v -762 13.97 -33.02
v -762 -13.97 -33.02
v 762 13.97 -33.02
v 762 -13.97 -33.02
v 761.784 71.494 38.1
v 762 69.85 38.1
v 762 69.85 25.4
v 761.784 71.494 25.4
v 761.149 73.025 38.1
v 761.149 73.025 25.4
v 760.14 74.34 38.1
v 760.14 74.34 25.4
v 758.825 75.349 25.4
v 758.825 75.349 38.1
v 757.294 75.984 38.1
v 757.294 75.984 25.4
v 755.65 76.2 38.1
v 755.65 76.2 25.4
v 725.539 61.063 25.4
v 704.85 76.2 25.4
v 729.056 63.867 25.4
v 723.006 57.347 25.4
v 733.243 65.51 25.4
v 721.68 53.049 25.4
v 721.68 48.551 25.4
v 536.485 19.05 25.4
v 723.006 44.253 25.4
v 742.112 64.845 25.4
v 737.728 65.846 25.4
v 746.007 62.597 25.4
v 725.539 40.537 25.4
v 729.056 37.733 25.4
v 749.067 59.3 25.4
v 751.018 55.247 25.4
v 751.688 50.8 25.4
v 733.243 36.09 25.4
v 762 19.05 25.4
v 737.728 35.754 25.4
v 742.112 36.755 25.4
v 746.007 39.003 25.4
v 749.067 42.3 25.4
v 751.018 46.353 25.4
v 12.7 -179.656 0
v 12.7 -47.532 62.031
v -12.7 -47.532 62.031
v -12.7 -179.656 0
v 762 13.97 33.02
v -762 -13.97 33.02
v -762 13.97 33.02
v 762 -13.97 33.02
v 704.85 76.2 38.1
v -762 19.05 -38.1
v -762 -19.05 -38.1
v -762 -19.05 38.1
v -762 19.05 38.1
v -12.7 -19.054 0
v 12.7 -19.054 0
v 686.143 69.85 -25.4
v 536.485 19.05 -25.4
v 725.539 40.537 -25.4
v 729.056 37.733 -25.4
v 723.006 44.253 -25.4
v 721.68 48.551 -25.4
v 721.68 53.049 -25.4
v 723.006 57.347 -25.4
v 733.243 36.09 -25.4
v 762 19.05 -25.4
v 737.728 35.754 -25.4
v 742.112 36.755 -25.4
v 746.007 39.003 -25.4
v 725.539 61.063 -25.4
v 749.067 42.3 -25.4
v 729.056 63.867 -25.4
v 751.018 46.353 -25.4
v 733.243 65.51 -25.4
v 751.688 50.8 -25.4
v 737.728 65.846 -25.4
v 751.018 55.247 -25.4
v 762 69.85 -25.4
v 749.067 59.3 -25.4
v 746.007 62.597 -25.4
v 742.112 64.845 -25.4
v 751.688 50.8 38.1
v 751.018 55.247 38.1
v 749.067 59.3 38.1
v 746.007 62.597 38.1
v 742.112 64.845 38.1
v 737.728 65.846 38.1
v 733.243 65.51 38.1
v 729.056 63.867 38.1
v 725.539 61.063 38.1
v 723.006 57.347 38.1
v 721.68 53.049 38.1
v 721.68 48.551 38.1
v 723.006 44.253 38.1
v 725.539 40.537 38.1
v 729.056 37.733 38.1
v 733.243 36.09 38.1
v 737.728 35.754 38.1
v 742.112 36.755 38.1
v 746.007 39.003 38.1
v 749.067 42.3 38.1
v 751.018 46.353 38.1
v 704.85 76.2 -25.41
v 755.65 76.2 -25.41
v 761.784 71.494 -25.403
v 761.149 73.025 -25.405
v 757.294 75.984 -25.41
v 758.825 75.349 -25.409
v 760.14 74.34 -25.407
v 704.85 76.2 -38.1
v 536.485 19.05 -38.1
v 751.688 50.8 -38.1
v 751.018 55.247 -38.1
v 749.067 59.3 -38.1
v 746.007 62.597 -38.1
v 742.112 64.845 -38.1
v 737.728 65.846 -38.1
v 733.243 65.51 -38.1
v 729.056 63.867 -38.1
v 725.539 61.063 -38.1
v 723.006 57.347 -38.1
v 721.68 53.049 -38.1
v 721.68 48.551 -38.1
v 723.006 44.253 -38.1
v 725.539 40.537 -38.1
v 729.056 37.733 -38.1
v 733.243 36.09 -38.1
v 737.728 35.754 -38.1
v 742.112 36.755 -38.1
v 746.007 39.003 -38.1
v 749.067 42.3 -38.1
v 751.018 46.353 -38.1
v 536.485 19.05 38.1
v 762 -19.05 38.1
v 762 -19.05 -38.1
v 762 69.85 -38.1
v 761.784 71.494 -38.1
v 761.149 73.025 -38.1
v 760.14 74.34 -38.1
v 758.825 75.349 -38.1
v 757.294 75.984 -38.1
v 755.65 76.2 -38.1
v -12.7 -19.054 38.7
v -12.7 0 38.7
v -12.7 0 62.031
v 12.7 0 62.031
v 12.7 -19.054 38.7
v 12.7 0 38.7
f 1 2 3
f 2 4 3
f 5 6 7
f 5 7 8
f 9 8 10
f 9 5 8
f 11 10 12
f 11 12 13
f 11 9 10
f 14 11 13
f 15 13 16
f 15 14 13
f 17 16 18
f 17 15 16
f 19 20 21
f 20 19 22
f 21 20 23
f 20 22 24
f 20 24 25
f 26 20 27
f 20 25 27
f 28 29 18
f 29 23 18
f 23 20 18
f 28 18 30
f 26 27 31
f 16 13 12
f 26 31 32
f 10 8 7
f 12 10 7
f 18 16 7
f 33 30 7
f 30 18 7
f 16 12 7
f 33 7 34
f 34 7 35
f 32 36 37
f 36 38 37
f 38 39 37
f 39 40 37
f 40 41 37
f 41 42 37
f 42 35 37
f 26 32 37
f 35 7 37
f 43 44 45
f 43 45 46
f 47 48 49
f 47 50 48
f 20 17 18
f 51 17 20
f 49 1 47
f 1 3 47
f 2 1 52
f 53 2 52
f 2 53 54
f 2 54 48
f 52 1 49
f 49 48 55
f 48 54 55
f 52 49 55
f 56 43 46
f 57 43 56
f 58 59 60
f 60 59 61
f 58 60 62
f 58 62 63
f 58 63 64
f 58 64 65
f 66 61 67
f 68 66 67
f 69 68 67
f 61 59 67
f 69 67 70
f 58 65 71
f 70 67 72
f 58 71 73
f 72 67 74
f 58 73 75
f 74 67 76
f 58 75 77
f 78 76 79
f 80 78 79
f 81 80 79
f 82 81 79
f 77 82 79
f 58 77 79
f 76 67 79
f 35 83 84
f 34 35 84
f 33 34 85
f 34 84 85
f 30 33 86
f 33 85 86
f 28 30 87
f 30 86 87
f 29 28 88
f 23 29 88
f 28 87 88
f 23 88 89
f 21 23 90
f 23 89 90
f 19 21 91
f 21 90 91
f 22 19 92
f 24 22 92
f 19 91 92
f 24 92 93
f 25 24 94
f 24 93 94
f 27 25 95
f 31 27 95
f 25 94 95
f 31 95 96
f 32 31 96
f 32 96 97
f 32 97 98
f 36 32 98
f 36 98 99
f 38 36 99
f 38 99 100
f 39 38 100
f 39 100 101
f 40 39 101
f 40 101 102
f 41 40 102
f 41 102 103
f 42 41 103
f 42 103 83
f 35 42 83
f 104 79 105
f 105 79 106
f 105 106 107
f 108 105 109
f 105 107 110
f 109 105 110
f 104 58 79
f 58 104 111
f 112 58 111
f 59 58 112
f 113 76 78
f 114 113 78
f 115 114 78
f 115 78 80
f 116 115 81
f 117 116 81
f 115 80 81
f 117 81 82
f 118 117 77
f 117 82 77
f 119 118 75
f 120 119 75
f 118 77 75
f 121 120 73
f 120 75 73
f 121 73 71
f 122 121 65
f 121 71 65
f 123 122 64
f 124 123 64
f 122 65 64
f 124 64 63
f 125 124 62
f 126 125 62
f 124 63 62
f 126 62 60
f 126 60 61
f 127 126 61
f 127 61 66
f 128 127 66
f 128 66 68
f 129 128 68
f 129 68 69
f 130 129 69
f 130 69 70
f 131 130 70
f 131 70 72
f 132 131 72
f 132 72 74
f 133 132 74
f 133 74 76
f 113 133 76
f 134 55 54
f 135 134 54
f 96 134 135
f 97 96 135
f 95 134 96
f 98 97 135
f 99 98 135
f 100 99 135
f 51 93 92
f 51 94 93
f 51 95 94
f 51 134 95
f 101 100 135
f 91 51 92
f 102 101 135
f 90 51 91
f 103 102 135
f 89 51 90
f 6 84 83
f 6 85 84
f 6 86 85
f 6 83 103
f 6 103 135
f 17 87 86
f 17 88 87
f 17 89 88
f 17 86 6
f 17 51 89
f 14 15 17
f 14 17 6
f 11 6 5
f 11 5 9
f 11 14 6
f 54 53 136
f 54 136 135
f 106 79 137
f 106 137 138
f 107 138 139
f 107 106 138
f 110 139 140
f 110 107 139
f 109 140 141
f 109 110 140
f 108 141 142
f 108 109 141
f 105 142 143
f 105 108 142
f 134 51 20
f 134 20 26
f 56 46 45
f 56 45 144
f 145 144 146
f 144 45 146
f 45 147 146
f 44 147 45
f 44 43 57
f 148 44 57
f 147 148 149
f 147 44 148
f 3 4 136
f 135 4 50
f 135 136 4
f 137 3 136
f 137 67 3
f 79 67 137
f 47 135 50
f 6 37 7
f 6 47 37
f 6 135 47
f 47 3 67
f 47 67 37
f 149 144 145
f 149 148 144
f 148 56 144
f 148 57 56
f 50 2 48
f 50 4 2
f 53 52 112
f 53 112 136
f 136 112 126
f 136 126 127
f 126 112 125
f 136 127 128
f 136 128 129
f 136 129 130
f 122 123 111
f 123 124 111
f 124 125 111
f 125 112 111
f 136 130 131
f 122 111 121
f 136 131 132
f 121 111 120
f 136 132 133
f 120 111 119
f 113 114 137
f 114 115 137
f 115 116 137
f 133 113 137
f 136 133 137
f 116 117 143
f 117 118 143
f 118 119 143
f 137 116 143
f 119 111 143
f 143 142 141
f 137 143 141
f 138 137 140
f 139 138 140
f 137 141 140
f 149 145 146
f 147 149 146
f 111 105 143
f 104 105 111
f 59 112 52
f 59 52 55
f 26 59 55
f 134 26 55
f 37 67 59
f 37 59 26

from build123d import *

# Parameters (mm, degrees)
F0_W     = 38.1
F0_H     = 76.2
F1_DEPTH = 762
F2_T     = -5.08
F3_R     = 15.088451
F4_DEPTH = 76.2
F6_DEPTH = 1524.001
F8_DEPTH = 12.7


with BuildPart() as f1:
    # F0 (on Right) → F1 (new body, symmetric)
    with BuildSketch(Plane.YZ):
        Rectangle(F0_W, F0_H)
    extrude(amount=F1_DEPTH, both=True)

    # F2
    f2_openings = [f1.faces().sort_by_distance(p)[0] for p in [
        (-762, 0, 0),
        (762, 0, 0),
    ]]
    offset(amount=F2_T, openings=f2_openings)

    # F3 (on face) → F4 (join)
    with BuildSketch(Plane.XY.offset(38.1)):
        with BuildLine():
            Line((536.485165, 19.05), (762, 19.05))
            Line((762, 19.05), (762, 69.85))
            ThreePointArc((762, 69.85), (760.140128, 74.340128), (755.65, 76.2))
            Line((755.65, 76.2), (704.85, 76.2))
            Line((704.85, 76.2), (536.485165, 19.05))
        make_face()
        with Locations((736.6, 50.8)):
            Circle(F3_R, mode=Mode.SUBTRACT)
    extrude(amount=-F4_DEPTH)

    # F5 (on face) → F6 (cut, through all)
    with BuildSketch(Plane.YZ.offset(762)):
        Polygon((77.082947, 25.4), (69.85, 25.4), (19.05, 25.4), (19.05, -25.4), (69.85, -25.4), (77.082947, -25.411841), align=None)
    extrude(amount=-F6_DEPTH, mode=Mode.SUBTRACT)


with BuildPart() as f8:
    # F7 (on Right) → F8 (new body, symmetric)
    with BuildSketch(Plane.YZ):
        Polygon((-19.053811, 38.700264), (0, 38.700264), (0, 62.031277), (-47.531884, 62.031277), (-179.655552, 0), (-19.053811, 0), align=None)
    extrude(amount=F8_DEPTH, both=True)


solid = Compound([f1.part, f8.part])
